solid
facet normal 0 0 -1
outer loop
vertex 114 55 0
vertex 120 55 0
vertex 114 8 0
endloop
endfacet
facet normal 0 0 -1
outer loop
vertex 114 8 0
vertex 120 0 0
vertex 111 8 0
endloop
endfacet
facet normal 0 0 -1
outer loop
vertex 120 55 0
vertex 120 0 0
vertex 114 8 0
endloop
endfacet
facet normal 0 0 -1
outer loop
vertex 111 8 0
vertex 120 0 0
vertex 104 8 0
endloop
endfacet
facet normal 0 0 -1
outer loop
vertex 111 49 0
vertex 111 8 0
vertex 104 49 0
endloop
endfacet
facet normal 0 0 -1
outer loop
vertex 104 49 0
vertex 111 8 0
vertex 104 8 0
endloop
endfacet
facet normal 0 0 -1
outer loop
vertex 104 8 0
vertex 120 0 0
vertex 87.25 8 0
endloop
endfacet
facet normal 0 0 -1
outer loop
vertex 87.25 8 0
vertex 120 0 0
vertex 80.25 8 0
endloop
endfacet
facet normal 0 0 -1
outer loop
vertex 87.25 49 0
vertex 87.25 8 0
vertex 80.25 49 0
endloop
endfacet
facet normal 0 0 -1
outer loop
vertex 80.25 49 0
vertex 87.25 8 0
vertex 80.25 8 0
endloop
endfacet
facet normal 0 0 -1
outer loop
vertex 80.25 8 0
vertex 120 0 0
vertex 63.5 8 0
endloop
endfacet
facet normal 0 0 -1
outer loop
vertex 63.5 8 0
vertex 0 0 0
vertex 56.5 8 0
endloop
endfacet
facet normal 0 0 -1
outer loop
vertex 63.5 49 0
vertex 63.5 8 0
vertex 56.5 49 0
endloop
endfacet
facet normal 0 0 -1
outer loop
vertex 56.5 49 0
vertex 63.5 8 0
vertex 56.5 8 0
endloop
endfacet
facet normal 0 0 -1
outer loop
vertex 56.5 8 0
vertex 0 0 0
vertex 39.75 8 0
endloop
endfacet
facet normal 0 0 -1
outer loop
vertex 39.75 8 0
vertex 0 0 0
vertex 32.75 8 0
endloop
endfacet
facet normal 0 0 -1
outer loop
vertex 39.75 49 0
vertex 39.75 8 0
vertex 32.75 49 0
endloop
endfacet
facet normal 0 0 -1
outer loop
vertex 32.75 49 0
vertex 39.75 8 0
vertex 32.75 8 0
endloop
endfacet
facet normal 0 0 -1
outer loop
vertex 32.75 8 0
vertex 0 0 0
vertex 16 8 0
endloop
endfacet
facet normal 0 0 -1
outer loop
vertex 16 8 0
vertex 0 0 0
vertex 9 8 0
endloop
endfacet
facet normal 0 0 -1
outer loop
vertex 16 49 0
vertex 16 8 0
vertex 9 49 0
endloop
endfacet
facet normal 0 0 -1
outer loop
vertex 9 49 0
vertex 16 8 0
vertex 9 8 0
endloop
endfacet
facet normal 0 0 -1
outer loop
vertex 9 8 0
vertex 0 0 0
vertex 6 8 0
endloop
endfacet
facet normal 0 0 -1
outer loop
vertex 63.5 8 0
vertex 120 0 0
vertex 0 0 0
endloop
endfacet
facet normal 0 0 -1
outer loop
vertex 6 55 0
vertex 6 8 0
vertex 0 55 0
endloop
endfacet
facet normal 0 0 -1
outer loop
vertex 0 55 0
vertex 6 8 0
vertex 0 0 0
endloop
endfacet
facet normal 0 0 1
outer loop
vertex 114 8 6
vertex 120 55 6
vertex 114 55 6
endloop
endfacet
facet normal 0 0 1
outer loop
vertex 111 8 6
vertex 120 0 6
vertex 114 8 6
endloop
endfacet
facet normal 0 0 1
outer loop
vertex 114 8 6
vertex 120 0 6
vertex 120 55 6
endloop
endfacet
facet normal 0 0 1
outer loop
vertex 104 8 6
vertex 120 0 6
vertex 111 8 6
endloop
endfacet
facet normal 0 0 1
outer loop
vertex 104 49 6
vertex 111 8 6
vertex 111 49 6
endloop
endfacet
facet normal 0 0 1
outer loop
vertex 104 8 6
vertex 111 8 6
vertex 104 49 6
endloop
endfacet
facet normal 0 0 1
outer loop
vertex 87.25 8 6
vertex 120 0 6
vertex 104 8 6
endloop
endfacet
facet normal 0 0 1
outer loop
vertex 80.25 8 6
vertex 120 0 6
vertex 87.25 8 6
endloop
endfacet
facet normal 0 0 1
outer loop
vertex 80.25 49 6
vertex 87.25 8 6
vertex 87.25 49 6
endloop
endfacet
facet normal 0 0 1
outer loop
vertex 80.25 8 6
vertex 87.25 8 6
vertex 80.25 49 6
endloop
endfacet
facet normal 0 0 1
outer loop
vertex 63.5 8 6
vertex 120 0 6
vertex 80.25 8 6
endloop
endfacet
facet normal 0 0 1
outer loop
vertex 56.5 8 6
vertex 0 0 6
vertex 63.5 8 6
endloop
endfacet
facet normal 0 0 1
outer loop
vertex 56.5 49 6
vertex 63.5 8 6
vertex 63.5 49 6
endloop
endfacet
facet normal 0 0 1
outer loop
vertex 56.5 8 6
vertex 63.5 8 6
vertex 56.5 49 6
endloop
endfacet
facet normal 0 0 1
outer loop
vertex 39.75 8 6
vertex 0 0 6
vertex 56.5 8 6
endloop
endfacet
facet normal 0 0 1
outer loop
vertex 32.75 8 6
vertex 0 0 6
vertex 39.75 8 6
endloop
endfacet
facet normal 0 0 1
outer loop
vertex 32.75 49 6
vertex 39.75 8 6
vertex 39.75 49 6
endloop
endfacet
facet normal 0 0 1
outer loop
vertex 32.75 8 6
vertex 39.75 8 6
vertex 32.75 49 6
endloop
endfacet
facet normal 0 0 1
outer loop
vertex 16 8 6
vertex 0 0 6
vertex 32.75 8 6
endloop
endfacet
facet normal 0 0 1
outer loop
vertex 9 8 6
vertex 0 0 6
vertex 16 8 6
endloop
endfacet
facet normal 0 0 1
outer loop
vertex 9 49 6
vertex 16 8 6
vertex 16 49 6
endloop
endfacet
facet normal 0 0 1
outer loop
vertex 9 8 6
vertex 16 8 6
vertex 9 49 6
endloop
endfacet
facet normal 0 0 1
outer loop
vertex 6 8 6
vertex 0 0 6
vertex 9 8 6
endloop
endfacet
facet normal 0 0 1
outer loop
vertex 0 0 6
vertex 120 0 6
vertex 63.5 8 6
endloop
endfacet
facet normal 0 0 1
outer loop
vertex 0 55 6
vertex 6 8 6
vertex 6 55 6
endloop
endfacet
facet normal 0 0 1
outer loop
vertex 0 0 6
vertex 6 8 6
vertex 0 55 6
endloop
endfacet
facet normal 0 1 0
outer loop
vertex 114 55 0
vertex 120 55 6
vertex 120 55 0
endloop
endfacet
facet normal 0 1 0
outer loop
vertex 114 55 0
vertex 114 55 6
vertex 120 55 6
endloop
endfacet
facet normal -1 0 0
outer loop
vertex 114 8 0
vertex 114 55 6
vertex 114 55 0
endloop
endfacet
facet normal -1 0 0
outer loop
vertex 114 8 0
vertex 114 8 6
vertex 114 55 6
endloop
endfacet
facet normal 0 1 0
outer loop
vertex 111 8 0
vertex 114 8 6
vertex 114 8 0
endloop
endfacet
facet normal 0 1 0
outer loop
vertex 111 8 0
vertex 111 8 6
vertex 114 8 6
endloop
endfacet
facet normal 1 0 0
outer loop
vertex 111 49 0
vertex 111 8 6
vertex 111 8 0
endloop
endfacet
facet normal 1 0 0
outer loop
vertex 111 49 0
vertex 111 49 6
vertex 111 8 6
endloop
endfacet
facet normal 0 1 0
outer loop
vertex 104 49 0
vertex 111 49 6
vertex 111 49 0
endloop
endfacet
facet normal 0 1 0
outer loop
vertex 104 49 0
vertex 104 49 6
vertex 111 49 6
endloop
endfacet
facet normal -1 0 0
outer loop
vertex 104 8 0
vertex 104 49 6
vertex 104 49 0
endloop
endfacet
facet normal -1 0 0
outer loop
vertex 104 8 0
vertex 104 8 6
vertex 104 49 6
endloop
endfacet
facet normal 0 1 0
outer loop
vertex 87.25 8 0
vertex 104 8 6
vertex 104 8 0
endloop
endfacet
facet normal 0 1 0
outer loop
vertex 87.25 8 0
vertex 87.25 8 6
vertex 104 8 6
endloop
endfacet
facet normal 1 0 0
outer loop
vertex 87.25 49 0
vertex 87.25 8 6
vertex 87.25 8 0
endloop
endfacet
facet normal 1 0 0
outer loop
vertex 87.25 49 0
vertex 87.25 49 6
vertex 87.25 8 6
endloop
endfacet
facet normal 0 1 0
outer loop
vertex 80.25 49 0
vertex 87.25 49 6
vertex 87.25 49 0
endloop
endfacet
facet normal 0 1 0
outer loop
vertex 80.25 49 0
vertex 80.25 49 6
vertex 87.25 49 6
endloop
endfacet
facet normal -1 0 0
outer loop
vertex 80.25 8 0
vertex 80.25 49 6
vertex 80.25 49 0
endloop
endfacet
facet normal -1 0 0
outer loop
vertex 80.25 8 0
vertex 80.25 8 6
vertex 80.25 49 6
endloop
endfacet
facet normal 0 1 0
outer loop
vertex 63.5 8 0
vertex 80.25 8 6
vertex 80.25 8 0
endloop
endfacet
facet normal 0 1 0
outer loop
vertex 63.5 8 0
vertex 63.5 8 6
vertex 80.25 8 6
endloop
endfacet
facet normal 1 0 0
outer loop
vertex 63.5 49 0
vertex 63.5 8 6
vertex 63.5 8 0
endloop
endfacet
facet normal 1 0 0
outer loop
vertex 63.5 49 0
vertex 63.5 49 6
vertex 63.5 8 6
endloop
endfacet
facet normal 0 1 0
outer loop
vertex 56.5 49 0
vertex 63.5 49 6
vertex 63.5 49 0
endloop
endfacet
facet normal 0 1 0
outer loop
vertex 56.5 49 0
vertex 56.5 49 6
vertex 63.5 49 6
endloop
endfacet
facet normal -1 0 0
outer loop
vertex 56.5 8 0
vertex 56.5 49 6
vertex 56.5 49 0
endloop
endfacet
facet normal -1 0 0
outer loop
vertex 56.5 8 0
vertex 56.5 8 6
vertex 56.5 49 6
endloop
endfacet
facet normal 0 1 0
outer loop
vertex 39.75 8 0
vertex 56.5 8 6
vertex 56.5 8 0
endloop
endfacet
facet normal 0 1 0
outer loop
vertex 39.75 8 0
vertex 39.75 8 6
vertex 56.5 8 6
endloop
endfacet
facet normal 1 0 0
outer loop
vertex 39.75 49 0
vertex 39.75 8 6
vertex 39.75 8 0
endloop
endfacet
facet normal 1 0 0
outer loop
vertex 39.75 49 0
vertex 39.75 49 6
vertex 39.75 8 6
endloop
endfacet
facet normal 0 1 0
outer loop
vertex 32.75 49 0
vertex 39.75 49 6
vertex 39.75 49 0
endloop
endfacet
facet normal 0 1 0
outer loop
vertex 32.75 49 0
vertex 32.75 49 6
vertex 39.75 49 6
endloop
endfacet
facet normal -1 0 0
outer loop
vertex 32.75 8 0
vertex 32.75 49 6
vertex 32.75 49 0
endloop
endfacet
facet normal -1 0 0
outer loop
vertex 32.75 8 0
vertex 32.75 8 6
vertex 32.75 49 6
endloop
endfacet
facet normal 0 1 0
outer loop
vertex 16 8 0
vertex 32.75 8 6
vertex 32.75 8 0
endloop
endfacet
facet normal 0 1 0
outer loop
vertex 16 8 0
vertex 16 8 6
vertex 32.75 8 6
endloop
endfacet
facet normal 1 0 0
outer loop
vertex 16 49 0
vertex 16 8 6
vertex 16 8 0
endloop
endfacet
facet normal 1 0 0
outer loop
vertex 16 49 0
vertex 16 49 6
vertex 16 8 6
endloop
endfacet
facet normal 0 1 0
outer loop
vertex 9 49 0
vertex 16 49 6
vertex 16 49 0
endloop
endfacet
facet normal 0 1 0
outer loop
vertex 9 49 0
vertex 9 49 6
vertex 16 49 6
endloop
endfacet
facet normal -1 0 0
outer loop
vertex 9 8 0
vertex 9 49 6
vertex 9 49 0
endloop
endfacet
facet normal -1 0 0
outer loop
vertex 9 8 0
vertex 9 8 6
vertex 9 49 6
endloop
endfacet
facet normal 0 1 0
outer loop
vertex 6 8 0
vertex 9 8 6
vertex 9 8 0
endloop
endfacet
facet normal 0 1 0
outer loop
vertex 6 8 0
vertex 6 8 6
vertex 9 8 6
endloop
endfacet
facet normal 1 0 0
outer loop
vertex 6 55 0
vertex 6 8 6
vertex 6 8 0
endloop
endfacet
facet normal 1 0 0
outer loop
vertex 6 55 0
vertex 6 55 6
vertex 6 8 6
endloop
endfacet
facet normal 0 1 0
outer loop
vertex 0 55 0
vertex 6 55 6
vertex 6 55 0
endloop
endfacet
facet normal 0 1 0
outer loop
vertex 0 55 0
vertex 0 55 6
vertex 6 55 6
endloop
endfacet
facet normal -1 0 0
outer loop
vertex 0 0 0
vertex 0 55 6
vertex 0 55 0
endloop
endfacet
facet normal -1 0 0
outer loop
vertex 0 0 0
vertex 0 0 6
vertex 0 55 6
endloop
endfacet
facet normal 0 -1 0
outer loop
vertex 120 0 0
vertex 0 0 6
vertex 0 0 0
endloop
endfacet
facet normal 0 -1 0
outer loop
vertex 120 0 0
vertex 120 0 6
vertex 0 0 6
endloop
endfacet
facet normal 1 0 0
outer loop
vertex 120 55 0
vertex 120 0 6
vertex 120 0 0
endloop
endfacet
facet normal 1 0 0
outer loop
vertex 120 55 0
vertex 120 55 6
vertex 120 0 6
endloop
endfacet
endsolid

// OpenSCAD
$fn = 32;

// ----------------------------------------------------------------------
// Guard grille: 5 slats over a 120 x 55 mm plate
// ----------------------------------------------------------------------

// --- parameters (mm) ---
profile_height = 6;       // extrusion height
profile_points = 28;      // points of the closed outline

profile = [[0, 0], [120, 0], [120, 55], [114, 55], [114, 8], [111, 8], [111, 49], [104, 49], [104, 8], [87.25, 8], [87.25, 49], [80.25, 49], [80.25, 8], [63.5, 8], [63.5, 49], [56.5, 49], [56.5, 8], [39.75, 8], [39.75, 49], [32.75, 49], [32.75, 8], [16, 8], [16, 49], [9, 49], [9, 8], [6, 8], [6, 55], [0, 55]];  // single closed polygon, 28 points, counter clockwise

// --- the one profile operation ---
linear_extrude(height = profile_height) polygon(points = profile);
